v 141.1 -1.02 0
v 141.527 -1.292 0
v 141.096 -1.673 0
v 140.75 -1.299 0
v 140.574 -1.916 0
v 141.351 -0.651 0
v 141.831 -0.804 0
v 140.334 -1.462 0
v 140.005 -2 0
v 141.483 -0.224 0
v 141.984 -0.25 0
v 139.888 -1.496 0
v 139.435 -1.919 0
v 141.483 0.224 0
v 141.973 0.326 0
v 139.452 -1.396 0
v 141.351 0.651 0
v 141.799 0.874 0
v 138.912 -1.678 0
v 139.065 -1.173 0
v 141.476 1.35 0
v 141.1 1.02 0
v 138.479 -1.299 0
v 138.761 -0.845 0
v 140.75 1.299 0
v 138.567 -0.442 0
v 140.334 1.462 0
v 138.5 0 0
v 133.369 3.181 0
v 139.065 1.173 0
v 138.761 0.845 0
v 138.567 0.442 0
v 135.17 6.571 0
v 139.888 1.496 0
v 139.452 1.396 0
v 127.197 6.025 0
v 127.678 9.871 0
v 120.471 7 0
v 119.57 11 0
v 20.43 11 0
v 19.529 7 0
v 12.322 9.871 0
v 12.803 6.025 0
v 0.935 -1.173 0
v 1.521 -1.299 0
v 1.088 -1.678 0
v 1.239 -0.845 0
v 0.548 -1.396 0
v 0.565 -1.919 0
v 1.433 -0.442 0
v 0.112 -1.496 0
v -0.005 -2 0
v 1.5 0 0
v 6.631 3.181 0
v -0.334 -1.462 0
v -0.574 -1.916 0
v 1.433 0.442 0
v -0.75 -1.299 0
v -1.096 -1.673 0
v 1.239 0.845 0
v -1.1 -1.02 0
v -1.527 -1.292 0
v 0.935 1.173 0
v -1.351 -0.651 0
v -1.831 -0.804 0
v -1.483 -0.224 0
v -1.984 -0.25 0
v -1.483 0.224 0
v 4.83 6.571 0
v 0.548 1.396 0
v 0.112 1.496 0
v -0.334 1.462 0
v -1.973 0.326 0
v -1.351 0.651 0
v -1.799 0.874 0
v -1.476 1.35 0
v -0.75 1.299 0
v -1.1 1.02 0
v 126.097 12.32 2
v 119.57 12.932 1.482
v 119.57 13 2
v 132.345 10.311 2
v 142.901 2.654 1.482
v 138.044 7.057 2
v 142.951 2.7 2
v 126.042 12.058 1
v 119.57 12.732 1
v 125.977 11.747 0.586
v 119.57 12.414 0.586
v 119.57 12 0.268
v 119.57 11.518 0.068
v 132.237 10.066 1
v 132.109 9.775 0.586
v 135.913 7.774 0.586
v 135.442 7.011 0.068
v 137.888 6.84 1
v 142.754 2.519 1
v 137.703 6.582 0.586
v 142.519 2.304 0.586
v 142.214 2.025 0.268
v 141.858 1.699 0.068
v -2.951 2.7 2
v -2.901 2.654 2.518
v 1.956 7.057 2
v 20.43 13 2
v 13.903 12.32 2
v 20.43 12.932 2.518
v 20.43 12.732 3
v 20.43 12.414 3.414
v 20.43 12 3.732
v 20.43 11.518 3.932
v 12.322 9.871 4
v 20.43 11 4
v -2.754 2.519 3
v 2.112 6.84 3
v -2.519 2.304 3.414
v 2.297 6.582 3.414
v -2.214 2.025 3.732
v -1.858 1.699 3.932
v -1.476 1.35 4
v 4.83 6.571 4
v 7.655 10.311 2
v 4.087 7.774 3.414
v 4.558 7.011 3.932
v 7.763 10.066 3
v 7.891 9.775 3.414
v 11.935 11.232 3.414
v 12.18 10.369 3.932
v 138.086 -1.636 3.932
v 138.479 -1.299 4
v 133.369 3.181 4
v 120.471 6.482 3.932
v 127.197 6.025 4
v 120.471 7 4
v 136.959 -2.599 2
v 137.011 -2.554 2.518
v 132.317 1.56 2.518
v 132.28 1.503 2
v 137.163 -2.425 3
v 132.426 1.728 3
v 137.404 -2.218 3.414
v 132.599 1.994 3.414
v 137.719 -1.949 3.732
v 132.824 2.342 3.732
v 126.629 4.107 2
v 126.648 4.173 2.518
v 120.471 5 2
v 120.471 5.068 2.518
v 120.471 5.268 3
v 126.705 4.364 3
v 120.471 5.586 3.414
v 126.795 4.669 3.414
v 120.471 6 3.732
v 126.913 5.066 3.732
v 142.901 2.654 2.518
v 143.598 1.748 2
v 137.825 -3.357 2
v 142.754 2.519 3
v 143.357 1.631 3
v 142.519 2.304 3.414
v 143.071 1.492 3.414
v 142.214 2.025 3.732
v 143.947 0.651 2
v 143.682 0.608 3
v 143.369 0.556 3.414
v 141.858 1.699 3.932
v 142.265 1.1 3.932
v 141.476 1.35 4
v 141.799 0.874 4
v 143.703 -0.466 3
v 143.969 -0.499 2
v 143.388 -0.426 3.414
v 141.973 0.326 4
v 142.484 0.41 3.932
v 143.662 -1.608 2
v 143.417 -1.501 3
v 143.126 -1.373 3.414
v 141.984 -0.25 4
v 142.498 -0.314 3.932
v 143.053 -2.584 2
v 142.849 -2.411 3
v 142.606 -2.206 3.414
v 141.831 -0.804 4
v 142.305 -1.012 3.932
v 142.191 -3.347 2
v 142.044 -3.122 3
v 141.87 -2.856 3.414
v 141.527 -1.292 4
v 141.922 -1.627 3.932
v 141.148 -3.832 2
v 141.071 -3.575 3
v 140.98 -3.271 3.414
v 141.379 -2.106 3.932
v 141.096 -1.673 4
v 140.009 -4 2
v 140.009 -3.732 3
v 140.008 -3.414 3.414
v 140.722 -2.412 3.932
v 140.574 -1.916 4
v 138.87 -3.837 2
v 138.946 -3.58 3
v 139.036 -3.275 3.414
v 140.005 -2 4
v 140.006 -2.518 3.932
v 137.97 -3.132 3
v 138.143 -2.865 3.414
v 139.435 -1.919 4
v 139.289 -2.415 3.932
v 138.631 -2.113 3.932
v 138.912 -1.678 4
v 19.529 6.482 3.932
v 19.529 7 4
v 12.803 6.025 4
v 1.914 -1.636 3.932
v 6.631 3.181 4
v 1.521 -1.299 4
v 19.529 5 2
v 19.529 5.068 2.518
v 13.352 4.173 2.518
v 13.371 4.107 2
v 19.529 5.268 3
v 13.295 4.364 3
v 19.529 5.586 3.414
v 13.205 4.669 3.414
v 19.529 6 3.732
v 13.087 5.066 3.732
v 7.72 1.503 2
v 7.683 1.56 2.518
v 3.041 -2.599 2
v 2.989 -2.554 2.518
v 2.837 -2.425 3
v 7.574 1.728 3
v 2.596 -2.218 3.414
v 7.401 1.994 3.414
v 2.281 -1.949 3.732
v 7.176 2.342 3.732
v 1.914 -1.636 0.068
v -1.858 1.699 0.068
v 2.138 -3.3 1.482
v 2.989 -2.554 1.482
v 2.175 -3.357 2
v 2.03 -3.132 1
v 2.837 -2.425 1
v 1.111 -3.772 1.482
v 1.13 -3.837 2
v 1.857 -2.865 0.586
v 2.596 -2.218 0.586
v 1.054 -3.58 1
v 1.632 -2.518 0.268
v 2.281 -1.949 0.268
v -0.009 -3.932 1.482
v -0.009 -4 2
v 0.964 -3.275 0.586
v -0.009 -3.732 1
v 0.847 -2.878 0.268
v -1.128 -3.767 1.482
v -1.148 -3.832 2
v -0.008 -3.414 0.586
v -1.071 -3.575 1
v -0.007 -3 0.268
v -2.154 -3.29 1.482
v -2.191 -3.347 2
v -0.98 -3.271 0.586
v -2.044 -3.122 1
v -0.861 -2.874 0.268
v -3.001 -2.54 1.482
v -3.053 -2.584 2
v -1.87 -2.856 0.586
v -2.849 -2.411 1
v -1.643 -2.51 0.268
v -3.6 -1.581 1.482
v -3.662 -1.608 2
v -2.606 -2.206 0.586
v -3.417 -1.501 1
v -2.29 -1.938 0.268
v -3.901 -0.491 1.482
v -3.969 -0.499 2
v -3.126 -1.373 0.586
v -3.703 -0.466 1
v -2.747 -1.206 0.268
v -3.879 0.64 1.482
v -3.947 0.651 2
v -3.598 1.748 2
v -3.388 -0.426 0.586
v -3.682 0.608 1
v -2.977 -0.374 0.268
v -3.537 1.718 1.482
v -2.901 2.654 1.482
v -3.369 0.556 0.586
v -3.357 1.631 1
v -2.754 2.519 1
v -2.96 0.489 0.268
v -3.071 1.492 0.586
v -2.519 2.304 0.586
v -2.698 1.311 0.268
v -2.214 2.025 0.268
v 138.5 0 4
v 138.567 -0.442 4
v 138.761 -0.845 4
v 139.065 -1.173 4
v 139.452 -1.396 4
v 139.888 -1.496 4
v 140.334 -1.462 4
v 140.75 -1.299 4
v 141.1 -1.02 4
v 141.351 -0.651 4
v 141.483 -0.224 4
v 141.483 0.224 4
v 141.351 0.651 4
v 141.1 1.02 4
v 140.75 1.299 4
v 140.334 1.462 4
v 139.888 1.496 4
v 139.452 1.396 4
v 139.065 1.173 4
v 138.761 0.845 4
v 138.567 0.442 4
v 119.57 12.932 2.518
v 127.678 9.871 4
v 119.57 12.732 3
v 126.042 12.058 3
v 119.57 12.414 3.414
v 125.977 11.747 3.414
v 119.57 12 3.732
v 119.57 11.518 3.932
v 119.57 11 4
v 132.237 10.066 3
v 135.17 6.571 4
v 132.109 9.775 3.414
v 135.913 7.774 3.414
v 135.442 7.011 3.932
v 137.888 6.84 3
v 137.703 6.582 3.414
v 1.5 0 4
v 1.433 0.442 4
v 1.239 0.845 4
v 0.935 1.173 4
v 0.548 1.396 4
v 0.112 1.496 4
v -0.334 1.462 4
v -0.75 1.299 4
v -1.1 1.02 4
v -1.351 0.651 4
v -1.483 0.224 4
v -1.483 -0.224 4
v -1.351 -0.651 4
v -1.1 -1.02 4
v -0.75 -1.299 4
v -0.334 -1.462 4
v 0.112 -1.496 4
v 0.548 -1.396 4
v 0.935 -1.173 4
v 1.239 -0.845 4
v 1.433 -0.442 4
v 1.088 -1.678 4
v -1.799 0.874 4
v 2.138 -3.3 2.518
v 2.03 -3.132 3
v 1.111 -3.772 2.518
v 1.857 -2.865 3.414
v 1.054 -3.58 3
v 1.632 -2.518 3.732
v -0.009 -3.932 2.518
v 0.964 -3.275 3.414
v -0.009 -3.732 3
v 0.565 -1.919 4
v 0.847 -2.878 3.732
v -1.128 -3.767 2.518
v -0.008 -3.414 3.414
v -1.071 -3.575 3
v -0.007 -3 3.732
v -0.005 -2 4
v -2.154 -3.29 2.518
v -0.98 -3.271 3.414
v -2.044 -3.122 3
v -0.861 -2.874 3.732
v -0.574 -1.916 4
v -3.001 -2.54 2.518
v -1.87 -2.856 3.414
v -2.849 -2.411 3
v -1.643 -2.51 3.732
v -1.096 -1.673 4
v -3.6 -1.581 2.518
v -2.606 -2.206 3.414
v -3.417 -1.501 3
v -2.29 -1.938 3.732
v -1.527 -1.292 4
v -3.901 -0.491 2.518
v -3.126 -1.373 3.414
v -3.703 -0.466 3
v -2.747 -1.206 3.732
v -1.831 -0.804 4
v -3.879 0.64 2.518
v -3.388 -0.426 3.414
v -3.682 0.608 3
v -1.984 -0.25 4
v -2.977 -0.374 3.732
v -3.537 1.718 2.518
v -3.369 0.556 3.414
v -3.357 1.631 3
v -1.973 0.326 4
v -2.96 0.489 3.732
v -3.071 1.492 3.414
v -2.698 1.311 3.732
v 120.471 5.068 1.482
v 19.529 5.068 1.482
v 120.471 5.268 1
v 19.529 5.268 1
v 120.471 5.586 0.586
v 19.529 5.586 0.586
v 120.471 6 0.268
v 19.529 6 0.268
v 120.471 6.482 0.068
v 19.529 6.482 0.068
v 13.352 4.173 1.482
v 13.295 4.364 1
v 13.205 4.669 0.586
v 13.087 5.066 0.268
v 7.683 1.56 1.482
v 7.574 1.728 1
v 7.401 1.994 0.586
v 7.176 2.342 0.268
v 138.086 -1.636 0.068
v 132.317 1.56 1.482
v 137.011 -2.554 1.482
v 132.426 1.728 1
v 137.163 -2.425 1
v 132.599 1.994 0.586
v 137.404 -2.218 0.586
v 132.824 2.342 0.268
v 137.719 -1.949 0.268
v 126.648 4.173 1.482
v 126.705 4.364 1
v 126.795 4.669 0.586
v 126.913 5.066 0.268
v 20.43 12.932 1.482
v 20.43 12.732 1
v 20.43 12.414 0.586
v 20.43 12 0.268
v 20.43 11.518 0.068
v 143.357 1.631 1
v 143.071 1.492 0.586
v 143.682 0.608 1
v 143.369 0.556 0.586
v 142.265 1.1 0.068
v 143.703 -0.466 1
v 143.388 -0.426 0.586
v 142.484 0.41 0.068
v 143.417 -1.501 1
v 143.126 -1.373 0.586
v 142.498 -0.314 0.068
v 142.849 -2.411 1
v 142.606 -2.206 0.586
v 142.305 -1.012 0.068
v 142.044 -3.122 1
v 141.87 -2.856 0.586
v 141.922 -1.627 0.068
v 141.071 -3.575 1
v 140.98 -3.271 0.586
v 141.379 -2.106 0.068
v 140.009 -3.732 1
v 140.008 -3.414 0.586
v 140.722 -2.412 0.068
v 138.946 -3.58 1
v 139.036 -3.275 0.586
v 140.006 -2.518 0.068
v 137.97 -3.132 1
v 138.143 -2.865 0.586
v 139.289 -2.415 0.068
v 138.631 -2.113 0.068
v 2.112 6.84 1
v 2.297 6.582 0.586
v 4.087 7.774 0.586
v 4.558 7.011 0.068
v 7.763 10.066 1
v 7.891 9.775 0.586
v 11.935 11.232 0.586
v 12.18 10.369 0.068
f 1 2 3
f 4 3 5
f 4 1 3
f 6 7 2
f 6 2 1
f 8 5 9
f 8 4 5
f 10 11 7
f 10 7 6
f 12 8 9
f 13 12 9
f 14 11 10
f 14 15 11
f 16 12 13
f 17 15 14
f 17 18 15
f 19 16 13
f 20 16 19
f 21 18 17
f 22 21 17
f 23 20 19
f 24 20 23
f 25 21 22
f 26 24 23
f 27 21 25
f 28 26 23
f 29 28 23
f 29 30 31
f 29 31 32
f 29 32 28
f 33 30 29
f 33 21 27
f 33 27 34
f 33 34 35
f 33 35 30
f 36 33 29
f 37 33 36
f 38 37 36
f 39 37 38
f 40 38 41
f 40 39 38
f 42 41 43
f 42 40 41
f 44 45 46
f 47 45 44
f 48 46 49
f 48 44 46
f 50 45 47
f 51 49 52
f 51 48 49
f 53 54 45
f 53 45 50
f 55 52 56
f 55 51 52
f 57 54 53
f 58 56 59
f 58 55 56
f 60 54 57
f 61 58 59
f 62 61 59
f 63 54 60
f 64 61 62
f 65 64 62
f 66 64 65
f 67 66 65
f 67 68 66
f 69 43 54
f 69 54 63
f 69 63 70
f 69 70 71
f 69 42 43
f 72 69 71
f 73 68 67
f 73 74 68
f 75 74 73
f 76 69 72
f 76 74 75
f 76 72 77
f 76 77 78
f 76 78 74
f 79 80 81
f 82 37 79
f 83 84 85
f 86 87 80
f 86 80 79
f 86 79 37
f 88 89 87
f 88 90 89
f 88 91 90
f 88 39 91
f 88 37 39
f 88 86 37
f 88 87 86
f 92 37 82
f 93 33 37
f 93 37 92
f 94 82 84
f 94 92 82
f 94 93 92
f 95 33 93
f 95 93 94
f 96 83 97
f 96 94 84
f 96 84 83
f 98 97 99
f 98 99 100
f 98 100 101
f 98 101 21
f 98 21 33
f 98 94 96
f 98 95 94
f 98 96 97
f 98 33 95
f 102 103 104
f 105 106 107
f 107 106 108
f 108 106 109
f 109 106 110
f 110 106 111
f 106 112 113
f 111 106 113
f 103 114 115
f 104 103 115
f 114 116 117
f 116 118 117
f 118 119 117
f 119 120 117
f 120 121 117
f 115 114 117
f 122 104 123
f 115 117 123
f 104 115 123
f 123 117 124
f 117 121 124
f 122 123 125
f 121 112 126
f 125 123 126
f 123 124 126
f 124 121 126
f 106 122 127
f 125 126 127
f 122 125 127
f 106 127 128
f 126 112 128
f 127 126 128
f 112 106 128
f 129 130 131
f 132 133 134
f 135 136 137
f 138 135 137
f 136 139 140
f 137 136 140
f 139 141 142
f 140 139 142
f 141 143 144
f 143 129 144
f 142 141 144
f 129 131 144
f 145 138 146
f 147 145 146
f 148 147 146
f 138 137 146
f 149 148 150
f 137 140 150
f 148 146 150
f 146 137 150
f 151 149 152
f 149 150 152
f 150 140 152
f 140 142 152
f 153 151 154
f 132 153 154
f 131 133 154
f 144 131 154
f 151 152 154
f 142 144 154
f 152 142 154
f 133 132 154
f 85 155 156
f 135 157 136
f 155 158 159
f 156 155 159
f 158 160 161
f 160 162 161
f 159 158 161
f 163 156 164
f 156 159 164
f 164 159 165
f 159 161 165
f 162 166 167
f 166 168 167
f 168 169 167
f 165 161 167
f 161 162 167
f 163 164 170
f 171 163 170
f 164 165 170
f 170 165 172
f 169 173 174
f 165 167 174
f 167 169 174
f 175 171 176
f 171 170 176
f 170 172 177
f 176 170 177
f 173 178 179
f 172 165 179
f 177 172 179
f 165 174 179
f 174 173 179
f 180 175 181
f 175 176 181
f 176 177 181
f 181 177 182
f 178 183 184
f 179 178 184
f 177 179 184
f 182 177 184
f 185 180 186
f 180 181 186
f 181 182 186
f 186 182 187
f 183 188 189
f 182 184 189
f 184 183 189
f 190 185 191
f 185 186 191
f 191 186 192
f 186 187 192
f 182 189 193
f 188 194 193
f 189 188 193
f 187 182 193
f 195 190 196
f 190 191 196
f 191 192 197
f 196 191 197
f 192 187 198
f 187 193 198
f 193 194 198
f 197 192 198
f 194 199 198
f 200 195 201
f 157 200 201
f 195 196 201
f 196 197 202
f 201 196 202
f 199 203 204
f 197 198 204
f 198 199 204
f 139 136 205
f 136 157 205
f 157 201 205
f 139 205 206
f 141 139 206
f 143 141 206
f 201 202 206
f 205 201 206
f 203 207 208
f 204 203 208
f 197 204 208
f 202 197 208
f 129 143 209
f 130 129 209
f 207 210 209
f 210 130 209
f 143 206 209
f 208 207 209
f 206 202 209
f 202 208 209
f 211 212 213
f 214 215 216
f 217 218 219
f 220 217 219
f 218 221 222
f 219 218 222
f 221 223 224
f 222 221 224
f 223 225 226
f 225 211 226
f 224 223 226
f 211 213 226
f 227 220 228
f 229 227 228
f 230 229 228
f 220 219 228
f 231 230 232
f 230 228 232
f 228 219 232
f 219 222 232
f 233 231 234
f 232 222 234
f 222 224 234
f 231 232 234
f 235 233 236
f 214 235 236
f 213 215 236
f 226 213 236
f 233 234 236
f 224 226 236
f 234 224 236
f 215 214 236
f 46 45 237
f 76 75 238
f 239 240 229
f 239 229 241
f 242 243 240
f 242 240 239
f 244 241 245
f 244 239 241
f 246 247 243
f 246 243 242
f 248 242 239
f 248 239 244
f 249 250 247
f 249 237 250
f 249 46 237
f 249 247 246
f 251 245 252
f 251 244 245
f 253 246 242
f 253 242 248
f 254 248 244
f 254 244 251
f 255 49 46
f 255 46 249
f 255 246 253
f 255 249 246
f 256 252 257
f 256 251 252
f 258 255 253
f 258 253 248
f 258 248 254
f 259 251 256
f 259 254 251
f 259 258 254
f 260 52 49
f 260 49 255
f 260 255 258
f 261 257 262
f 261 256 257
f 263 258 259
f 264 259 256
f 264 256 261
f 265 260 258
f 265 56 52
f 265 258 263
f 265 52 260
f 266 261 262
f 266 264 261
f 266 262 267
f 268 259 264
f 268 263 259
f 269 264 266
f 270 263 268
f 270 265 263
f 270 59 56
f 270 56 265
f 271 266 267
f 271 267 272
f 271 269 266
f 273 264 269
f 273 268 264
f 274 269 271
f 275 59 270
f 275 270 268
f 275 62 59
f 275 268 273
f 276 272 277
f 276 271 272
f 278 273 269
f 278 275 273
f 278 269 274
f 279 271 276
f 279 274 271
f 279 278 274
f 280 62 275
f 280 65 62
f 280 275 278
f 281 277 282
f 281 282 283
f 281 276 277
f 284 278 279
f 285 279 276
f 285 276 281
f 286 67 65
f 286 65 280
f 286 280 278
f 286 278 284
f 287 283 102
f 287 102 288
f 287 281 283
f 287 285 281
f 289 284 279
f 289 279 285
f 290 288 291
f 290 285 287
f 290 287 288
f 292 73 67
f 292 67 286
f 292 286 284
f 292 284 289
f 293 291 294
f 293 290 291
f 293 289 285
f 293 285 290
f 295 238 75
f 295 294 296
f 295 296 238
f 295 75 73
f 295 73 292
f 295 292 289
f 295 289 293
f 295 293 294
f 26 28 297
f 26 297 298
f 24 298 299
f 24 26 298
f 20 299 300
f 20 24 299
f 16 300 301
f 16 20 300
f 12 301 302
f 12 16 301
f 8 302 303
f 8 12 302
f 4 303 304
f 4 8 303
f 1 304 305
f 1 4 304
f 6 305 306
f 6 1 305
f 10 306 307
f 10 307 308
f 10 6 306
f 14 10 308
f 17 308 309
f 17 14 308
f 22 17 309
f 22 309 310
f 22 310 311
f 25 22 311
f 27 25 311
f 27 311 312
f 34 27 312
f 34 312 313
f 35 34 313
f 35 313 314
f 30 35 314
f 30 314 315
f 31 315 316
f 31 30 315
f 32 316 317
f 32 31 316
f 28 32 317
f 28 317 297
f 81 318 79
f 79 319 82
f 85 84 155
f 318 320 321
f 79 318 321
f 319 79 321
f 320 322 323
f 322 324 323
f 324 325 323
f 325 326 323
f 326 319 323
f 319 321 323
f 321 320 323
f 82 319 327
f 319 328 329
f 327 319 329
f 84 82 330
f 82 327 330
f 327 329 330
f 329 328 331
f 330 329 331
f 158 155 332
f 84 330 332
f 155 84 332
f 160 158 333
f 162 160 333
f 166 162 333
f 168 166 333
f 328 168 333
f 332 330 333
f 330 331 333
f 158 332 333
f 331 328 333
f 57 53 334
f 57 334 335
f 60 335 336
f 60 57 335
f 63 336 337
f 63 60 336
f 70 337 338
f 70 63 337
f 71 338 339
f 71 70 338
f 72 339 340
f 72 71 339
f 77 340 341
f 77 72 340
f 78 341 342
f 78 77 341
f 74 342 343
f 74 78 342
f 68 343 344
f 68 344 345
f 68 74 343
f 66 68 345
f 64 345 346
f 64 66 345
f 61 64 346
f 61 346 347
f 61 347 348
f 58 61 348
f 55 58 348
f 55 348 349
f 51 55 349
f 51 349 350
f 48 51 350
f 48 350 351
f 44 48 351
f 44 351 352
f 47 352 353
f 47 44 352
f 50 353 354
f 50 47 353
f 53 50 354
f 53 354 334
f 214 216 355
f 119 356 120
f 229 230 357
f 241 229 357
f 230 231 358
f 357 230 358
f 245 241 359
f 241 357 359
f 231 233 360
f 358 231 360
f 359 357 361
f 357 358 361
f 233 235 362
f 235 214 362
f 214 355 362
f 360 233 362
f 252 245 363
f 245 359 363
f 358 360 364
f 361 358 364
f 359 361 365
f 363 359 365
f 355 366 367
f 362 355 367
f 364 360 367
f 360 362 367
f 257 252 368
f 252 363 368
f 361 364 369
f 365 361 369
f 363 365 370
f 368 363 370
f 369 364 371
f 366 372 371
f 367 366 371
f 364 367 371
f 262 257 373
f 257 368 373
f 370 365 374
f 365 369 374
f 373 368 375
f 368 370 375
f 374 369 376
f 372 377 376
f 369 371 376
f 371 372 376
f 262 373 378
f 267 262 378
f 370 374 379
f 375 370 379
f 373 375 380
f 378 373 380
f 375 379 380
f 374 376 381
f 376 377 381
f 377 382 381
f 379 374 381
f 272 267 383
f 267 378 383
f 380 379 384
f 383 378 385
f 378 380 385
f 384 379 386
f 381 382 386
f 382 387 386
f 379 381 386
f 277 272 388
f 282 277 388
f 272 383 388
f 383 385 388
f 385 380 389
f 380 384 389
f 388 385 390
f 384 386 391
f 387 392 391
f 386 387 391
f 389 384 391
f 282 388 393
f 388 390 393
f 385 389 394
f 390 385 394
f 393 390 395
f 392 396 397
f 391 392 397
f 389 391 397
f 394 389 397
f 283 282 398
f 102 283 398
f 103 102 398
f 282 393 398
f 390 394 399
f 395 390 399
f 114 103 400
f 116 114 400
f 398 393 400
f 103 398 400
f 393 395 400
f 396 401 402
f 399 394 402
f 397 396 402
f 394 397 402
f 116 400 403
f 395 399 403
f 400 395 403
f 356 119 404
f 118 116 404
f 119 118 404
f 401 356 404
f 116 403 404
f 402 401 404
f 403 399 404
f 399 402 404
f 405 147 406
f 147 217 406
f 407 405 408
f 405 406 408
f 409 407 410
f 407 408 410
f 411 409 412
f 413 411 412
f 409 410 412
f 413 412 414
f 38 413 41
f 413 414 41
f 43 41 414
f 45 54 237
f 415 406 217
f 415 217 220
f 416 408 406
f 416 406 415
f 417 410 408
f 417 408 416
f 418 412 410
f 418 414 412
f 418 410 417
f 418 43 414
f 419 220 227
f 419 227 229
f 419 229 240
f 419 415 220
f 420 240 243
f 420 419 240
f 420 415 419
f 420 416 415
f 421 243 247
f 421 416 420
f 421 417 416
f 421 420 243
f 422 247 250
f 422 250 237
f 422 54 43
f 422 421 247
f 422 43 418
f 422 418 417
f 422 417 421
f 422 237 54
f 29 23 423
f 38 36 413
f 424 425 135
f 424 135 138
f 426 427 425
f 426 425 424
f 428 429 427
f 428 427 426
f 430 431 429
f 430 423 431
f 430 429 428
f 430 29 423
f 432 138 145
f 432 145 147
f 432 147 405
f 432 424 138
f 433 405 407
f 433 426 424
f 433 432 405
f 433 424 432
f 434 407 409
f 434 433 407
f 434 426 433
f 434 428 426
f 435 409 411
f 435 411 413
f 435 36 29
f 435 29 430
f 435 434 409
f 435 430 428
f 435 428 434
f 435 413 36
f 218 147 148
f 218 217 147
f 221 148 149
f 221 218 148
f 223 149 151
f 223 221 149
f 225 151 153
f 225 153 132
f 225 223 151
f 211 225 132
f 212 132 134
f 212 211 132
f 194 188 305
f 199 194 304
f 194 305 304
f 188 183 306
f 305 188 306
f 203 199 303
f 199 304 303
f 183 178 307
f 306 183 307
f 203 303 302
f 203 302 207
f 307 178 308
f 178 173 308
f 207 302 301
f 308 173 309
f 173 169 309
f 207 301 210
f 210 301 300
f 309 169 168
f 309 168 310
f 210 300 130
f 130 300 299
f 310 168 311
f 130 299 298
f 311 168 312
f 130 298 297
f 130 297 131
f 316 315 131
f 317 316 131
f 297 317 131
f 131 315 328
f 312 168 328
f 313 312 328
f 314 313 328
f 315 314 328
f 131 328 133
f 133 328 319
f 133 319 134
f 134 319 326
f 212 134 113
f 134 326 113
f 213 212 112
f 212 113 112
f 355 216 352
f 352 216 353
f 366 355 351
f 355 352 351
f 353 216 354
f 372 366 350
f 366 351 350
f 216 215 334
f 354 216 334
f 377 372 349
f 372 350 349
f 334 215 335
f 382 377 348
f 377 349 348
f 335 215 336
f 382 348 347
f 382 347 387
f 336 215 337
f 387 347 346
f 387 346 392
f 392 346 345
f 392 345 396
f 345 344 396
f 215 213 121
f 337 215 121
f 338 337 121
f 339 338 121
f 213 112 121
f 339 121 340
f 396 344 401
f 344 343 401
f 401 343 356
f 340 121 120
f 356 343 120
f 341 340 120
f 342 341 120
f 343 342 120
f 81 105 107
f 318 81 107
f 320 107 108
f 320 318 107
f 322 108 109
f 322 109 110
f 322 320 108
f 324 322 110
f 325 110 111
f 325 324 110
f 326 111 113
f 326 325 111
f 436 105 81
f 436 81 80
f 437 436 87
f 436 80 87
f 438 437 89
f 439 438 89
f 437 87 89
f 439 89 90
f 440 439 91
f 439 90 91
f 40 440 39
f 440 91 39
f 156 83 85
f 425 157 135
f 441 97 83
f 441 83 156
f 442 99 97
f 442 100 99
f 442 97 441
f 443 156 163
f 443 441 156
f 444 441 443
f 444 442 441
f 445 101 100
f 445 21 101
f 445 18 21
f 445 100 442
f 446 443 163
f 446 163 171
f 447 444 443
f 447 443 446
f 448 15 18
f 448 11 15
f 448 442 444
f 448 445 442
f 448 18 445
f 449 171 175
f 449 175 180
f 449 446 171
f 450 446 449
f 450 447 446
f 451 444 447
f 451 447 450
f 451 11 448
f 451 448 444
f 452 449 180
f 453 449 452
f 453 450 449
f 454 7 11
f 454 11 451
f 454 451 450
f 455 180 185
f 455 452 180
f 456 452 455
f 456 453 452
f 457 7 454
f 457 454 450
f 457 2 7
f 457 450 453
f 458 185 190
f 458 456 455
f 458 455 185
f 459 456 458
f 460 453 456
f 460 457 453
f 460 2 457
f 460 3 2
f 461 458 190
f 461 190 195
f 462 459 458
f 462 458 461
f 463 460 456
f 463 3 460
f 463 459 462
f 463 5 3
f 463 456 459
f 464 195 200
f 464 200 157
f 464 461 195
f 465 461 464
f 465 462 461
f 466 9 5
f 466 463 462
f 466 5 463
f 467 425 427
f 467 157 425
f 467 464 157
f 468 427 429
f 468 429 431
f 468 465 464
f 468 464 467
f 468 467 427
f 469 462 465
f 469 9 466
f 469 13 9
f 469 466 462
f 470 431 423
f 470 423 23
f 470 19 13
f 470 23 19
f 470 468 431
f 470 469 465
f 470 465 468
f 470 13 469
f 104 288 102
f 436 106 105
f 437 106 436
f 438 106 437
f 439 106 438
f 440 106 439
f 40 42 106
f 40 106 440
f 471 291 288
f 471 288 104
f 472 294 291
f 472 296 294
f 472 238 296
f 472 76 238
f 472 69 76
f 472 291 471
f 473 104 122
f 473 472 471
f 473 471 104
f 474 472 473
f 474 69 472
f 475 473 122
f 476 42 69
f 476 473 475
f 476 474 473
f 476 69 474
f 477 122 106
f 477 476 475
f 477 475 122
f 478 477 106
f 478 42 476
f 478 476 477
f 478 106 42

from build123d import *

# Parameters (mm, degrees)
SKETCH1_R           = 1.5
BOSS_EXTRUDE1_DEPTH = 4
FILLET1_R           = 2


with BuildPart() as part:
    # Sketch1 → Boss-Extrude1 (new body)
    with BuildSketch(Plane.XY):
        with BuildLine():
            Line((20.430139316, 13), (119.569860684, 13))
            ThreePointArc((119.569860684, 13), (132.344758657, 10.310849901), (142.951440202, 2.699814945))
            ThreePointArc((142.951440202, 2.699814945), (142.64957914, -2.996619826), (136.959055493, -2.598587405))
            ThreePointArc((136.959055493, -2.598587405), (129.548246583, 3.008962434), (120.470775938, 5))
            Line((120.470775938, 5), (19.529224062, 5))
            ThreePointArc((19.529224062, 5), (10.451753417, 3.008962434), (3.040944507, -2.598587405))
            ThreePointArc((3.040944507, -2.598587405), (-2.64957914, -2.996619826), (-2.951440202, 2.699814945))
            ThreePointArc((-2.951440202, 2.699814945), (7.655241343, 10.310849901), (20.430139316, 13))
        make_face()
        Circle(SKETCH1_R, mode=Mode.SUBTRACT)
        with Locations(Location((140, 0, 0), (0, 0, 180))):
            Circle(SKETCH1_R, mode=Mode.SUBTRACT)
    extrude(amount=BOSS_EXTRUDE1_DEPTH)

    # Fillet1
    fillet1_edges = [part.edges().sort_by_distance(p)[0] for p in [
        (10.451753417, 3.008962434, 4),
        (-2.64957914, -2.996619826, 4),
        (7.655241343, 10.310849901, 4),
        (70, 13, 4),
        (132.344758657, 10.310849901, 4),
        (142.64957914, -2.996619826, 4),
        (129.548246583, 3.008962434, 4),
        (10.451753417, 3.008962434, 0),
        (-2.64957914, -2.996619826, 0),
        (7.655241343, 10.310849901, 0),
        (70, 13, 0),
        (132.344758657, 10.310849901, 0),
        (142.64957914, -2.996619826, 0),
        (129.548246583, 3.008962434, 0),
        (70, 5, 4),
        (70, 5, 0),
    ]]
    fillet(fillet1_edges, radius=FILLET1_R - 0.0001)  # a hair under: the kernel refuses the full size


solid = part.part
